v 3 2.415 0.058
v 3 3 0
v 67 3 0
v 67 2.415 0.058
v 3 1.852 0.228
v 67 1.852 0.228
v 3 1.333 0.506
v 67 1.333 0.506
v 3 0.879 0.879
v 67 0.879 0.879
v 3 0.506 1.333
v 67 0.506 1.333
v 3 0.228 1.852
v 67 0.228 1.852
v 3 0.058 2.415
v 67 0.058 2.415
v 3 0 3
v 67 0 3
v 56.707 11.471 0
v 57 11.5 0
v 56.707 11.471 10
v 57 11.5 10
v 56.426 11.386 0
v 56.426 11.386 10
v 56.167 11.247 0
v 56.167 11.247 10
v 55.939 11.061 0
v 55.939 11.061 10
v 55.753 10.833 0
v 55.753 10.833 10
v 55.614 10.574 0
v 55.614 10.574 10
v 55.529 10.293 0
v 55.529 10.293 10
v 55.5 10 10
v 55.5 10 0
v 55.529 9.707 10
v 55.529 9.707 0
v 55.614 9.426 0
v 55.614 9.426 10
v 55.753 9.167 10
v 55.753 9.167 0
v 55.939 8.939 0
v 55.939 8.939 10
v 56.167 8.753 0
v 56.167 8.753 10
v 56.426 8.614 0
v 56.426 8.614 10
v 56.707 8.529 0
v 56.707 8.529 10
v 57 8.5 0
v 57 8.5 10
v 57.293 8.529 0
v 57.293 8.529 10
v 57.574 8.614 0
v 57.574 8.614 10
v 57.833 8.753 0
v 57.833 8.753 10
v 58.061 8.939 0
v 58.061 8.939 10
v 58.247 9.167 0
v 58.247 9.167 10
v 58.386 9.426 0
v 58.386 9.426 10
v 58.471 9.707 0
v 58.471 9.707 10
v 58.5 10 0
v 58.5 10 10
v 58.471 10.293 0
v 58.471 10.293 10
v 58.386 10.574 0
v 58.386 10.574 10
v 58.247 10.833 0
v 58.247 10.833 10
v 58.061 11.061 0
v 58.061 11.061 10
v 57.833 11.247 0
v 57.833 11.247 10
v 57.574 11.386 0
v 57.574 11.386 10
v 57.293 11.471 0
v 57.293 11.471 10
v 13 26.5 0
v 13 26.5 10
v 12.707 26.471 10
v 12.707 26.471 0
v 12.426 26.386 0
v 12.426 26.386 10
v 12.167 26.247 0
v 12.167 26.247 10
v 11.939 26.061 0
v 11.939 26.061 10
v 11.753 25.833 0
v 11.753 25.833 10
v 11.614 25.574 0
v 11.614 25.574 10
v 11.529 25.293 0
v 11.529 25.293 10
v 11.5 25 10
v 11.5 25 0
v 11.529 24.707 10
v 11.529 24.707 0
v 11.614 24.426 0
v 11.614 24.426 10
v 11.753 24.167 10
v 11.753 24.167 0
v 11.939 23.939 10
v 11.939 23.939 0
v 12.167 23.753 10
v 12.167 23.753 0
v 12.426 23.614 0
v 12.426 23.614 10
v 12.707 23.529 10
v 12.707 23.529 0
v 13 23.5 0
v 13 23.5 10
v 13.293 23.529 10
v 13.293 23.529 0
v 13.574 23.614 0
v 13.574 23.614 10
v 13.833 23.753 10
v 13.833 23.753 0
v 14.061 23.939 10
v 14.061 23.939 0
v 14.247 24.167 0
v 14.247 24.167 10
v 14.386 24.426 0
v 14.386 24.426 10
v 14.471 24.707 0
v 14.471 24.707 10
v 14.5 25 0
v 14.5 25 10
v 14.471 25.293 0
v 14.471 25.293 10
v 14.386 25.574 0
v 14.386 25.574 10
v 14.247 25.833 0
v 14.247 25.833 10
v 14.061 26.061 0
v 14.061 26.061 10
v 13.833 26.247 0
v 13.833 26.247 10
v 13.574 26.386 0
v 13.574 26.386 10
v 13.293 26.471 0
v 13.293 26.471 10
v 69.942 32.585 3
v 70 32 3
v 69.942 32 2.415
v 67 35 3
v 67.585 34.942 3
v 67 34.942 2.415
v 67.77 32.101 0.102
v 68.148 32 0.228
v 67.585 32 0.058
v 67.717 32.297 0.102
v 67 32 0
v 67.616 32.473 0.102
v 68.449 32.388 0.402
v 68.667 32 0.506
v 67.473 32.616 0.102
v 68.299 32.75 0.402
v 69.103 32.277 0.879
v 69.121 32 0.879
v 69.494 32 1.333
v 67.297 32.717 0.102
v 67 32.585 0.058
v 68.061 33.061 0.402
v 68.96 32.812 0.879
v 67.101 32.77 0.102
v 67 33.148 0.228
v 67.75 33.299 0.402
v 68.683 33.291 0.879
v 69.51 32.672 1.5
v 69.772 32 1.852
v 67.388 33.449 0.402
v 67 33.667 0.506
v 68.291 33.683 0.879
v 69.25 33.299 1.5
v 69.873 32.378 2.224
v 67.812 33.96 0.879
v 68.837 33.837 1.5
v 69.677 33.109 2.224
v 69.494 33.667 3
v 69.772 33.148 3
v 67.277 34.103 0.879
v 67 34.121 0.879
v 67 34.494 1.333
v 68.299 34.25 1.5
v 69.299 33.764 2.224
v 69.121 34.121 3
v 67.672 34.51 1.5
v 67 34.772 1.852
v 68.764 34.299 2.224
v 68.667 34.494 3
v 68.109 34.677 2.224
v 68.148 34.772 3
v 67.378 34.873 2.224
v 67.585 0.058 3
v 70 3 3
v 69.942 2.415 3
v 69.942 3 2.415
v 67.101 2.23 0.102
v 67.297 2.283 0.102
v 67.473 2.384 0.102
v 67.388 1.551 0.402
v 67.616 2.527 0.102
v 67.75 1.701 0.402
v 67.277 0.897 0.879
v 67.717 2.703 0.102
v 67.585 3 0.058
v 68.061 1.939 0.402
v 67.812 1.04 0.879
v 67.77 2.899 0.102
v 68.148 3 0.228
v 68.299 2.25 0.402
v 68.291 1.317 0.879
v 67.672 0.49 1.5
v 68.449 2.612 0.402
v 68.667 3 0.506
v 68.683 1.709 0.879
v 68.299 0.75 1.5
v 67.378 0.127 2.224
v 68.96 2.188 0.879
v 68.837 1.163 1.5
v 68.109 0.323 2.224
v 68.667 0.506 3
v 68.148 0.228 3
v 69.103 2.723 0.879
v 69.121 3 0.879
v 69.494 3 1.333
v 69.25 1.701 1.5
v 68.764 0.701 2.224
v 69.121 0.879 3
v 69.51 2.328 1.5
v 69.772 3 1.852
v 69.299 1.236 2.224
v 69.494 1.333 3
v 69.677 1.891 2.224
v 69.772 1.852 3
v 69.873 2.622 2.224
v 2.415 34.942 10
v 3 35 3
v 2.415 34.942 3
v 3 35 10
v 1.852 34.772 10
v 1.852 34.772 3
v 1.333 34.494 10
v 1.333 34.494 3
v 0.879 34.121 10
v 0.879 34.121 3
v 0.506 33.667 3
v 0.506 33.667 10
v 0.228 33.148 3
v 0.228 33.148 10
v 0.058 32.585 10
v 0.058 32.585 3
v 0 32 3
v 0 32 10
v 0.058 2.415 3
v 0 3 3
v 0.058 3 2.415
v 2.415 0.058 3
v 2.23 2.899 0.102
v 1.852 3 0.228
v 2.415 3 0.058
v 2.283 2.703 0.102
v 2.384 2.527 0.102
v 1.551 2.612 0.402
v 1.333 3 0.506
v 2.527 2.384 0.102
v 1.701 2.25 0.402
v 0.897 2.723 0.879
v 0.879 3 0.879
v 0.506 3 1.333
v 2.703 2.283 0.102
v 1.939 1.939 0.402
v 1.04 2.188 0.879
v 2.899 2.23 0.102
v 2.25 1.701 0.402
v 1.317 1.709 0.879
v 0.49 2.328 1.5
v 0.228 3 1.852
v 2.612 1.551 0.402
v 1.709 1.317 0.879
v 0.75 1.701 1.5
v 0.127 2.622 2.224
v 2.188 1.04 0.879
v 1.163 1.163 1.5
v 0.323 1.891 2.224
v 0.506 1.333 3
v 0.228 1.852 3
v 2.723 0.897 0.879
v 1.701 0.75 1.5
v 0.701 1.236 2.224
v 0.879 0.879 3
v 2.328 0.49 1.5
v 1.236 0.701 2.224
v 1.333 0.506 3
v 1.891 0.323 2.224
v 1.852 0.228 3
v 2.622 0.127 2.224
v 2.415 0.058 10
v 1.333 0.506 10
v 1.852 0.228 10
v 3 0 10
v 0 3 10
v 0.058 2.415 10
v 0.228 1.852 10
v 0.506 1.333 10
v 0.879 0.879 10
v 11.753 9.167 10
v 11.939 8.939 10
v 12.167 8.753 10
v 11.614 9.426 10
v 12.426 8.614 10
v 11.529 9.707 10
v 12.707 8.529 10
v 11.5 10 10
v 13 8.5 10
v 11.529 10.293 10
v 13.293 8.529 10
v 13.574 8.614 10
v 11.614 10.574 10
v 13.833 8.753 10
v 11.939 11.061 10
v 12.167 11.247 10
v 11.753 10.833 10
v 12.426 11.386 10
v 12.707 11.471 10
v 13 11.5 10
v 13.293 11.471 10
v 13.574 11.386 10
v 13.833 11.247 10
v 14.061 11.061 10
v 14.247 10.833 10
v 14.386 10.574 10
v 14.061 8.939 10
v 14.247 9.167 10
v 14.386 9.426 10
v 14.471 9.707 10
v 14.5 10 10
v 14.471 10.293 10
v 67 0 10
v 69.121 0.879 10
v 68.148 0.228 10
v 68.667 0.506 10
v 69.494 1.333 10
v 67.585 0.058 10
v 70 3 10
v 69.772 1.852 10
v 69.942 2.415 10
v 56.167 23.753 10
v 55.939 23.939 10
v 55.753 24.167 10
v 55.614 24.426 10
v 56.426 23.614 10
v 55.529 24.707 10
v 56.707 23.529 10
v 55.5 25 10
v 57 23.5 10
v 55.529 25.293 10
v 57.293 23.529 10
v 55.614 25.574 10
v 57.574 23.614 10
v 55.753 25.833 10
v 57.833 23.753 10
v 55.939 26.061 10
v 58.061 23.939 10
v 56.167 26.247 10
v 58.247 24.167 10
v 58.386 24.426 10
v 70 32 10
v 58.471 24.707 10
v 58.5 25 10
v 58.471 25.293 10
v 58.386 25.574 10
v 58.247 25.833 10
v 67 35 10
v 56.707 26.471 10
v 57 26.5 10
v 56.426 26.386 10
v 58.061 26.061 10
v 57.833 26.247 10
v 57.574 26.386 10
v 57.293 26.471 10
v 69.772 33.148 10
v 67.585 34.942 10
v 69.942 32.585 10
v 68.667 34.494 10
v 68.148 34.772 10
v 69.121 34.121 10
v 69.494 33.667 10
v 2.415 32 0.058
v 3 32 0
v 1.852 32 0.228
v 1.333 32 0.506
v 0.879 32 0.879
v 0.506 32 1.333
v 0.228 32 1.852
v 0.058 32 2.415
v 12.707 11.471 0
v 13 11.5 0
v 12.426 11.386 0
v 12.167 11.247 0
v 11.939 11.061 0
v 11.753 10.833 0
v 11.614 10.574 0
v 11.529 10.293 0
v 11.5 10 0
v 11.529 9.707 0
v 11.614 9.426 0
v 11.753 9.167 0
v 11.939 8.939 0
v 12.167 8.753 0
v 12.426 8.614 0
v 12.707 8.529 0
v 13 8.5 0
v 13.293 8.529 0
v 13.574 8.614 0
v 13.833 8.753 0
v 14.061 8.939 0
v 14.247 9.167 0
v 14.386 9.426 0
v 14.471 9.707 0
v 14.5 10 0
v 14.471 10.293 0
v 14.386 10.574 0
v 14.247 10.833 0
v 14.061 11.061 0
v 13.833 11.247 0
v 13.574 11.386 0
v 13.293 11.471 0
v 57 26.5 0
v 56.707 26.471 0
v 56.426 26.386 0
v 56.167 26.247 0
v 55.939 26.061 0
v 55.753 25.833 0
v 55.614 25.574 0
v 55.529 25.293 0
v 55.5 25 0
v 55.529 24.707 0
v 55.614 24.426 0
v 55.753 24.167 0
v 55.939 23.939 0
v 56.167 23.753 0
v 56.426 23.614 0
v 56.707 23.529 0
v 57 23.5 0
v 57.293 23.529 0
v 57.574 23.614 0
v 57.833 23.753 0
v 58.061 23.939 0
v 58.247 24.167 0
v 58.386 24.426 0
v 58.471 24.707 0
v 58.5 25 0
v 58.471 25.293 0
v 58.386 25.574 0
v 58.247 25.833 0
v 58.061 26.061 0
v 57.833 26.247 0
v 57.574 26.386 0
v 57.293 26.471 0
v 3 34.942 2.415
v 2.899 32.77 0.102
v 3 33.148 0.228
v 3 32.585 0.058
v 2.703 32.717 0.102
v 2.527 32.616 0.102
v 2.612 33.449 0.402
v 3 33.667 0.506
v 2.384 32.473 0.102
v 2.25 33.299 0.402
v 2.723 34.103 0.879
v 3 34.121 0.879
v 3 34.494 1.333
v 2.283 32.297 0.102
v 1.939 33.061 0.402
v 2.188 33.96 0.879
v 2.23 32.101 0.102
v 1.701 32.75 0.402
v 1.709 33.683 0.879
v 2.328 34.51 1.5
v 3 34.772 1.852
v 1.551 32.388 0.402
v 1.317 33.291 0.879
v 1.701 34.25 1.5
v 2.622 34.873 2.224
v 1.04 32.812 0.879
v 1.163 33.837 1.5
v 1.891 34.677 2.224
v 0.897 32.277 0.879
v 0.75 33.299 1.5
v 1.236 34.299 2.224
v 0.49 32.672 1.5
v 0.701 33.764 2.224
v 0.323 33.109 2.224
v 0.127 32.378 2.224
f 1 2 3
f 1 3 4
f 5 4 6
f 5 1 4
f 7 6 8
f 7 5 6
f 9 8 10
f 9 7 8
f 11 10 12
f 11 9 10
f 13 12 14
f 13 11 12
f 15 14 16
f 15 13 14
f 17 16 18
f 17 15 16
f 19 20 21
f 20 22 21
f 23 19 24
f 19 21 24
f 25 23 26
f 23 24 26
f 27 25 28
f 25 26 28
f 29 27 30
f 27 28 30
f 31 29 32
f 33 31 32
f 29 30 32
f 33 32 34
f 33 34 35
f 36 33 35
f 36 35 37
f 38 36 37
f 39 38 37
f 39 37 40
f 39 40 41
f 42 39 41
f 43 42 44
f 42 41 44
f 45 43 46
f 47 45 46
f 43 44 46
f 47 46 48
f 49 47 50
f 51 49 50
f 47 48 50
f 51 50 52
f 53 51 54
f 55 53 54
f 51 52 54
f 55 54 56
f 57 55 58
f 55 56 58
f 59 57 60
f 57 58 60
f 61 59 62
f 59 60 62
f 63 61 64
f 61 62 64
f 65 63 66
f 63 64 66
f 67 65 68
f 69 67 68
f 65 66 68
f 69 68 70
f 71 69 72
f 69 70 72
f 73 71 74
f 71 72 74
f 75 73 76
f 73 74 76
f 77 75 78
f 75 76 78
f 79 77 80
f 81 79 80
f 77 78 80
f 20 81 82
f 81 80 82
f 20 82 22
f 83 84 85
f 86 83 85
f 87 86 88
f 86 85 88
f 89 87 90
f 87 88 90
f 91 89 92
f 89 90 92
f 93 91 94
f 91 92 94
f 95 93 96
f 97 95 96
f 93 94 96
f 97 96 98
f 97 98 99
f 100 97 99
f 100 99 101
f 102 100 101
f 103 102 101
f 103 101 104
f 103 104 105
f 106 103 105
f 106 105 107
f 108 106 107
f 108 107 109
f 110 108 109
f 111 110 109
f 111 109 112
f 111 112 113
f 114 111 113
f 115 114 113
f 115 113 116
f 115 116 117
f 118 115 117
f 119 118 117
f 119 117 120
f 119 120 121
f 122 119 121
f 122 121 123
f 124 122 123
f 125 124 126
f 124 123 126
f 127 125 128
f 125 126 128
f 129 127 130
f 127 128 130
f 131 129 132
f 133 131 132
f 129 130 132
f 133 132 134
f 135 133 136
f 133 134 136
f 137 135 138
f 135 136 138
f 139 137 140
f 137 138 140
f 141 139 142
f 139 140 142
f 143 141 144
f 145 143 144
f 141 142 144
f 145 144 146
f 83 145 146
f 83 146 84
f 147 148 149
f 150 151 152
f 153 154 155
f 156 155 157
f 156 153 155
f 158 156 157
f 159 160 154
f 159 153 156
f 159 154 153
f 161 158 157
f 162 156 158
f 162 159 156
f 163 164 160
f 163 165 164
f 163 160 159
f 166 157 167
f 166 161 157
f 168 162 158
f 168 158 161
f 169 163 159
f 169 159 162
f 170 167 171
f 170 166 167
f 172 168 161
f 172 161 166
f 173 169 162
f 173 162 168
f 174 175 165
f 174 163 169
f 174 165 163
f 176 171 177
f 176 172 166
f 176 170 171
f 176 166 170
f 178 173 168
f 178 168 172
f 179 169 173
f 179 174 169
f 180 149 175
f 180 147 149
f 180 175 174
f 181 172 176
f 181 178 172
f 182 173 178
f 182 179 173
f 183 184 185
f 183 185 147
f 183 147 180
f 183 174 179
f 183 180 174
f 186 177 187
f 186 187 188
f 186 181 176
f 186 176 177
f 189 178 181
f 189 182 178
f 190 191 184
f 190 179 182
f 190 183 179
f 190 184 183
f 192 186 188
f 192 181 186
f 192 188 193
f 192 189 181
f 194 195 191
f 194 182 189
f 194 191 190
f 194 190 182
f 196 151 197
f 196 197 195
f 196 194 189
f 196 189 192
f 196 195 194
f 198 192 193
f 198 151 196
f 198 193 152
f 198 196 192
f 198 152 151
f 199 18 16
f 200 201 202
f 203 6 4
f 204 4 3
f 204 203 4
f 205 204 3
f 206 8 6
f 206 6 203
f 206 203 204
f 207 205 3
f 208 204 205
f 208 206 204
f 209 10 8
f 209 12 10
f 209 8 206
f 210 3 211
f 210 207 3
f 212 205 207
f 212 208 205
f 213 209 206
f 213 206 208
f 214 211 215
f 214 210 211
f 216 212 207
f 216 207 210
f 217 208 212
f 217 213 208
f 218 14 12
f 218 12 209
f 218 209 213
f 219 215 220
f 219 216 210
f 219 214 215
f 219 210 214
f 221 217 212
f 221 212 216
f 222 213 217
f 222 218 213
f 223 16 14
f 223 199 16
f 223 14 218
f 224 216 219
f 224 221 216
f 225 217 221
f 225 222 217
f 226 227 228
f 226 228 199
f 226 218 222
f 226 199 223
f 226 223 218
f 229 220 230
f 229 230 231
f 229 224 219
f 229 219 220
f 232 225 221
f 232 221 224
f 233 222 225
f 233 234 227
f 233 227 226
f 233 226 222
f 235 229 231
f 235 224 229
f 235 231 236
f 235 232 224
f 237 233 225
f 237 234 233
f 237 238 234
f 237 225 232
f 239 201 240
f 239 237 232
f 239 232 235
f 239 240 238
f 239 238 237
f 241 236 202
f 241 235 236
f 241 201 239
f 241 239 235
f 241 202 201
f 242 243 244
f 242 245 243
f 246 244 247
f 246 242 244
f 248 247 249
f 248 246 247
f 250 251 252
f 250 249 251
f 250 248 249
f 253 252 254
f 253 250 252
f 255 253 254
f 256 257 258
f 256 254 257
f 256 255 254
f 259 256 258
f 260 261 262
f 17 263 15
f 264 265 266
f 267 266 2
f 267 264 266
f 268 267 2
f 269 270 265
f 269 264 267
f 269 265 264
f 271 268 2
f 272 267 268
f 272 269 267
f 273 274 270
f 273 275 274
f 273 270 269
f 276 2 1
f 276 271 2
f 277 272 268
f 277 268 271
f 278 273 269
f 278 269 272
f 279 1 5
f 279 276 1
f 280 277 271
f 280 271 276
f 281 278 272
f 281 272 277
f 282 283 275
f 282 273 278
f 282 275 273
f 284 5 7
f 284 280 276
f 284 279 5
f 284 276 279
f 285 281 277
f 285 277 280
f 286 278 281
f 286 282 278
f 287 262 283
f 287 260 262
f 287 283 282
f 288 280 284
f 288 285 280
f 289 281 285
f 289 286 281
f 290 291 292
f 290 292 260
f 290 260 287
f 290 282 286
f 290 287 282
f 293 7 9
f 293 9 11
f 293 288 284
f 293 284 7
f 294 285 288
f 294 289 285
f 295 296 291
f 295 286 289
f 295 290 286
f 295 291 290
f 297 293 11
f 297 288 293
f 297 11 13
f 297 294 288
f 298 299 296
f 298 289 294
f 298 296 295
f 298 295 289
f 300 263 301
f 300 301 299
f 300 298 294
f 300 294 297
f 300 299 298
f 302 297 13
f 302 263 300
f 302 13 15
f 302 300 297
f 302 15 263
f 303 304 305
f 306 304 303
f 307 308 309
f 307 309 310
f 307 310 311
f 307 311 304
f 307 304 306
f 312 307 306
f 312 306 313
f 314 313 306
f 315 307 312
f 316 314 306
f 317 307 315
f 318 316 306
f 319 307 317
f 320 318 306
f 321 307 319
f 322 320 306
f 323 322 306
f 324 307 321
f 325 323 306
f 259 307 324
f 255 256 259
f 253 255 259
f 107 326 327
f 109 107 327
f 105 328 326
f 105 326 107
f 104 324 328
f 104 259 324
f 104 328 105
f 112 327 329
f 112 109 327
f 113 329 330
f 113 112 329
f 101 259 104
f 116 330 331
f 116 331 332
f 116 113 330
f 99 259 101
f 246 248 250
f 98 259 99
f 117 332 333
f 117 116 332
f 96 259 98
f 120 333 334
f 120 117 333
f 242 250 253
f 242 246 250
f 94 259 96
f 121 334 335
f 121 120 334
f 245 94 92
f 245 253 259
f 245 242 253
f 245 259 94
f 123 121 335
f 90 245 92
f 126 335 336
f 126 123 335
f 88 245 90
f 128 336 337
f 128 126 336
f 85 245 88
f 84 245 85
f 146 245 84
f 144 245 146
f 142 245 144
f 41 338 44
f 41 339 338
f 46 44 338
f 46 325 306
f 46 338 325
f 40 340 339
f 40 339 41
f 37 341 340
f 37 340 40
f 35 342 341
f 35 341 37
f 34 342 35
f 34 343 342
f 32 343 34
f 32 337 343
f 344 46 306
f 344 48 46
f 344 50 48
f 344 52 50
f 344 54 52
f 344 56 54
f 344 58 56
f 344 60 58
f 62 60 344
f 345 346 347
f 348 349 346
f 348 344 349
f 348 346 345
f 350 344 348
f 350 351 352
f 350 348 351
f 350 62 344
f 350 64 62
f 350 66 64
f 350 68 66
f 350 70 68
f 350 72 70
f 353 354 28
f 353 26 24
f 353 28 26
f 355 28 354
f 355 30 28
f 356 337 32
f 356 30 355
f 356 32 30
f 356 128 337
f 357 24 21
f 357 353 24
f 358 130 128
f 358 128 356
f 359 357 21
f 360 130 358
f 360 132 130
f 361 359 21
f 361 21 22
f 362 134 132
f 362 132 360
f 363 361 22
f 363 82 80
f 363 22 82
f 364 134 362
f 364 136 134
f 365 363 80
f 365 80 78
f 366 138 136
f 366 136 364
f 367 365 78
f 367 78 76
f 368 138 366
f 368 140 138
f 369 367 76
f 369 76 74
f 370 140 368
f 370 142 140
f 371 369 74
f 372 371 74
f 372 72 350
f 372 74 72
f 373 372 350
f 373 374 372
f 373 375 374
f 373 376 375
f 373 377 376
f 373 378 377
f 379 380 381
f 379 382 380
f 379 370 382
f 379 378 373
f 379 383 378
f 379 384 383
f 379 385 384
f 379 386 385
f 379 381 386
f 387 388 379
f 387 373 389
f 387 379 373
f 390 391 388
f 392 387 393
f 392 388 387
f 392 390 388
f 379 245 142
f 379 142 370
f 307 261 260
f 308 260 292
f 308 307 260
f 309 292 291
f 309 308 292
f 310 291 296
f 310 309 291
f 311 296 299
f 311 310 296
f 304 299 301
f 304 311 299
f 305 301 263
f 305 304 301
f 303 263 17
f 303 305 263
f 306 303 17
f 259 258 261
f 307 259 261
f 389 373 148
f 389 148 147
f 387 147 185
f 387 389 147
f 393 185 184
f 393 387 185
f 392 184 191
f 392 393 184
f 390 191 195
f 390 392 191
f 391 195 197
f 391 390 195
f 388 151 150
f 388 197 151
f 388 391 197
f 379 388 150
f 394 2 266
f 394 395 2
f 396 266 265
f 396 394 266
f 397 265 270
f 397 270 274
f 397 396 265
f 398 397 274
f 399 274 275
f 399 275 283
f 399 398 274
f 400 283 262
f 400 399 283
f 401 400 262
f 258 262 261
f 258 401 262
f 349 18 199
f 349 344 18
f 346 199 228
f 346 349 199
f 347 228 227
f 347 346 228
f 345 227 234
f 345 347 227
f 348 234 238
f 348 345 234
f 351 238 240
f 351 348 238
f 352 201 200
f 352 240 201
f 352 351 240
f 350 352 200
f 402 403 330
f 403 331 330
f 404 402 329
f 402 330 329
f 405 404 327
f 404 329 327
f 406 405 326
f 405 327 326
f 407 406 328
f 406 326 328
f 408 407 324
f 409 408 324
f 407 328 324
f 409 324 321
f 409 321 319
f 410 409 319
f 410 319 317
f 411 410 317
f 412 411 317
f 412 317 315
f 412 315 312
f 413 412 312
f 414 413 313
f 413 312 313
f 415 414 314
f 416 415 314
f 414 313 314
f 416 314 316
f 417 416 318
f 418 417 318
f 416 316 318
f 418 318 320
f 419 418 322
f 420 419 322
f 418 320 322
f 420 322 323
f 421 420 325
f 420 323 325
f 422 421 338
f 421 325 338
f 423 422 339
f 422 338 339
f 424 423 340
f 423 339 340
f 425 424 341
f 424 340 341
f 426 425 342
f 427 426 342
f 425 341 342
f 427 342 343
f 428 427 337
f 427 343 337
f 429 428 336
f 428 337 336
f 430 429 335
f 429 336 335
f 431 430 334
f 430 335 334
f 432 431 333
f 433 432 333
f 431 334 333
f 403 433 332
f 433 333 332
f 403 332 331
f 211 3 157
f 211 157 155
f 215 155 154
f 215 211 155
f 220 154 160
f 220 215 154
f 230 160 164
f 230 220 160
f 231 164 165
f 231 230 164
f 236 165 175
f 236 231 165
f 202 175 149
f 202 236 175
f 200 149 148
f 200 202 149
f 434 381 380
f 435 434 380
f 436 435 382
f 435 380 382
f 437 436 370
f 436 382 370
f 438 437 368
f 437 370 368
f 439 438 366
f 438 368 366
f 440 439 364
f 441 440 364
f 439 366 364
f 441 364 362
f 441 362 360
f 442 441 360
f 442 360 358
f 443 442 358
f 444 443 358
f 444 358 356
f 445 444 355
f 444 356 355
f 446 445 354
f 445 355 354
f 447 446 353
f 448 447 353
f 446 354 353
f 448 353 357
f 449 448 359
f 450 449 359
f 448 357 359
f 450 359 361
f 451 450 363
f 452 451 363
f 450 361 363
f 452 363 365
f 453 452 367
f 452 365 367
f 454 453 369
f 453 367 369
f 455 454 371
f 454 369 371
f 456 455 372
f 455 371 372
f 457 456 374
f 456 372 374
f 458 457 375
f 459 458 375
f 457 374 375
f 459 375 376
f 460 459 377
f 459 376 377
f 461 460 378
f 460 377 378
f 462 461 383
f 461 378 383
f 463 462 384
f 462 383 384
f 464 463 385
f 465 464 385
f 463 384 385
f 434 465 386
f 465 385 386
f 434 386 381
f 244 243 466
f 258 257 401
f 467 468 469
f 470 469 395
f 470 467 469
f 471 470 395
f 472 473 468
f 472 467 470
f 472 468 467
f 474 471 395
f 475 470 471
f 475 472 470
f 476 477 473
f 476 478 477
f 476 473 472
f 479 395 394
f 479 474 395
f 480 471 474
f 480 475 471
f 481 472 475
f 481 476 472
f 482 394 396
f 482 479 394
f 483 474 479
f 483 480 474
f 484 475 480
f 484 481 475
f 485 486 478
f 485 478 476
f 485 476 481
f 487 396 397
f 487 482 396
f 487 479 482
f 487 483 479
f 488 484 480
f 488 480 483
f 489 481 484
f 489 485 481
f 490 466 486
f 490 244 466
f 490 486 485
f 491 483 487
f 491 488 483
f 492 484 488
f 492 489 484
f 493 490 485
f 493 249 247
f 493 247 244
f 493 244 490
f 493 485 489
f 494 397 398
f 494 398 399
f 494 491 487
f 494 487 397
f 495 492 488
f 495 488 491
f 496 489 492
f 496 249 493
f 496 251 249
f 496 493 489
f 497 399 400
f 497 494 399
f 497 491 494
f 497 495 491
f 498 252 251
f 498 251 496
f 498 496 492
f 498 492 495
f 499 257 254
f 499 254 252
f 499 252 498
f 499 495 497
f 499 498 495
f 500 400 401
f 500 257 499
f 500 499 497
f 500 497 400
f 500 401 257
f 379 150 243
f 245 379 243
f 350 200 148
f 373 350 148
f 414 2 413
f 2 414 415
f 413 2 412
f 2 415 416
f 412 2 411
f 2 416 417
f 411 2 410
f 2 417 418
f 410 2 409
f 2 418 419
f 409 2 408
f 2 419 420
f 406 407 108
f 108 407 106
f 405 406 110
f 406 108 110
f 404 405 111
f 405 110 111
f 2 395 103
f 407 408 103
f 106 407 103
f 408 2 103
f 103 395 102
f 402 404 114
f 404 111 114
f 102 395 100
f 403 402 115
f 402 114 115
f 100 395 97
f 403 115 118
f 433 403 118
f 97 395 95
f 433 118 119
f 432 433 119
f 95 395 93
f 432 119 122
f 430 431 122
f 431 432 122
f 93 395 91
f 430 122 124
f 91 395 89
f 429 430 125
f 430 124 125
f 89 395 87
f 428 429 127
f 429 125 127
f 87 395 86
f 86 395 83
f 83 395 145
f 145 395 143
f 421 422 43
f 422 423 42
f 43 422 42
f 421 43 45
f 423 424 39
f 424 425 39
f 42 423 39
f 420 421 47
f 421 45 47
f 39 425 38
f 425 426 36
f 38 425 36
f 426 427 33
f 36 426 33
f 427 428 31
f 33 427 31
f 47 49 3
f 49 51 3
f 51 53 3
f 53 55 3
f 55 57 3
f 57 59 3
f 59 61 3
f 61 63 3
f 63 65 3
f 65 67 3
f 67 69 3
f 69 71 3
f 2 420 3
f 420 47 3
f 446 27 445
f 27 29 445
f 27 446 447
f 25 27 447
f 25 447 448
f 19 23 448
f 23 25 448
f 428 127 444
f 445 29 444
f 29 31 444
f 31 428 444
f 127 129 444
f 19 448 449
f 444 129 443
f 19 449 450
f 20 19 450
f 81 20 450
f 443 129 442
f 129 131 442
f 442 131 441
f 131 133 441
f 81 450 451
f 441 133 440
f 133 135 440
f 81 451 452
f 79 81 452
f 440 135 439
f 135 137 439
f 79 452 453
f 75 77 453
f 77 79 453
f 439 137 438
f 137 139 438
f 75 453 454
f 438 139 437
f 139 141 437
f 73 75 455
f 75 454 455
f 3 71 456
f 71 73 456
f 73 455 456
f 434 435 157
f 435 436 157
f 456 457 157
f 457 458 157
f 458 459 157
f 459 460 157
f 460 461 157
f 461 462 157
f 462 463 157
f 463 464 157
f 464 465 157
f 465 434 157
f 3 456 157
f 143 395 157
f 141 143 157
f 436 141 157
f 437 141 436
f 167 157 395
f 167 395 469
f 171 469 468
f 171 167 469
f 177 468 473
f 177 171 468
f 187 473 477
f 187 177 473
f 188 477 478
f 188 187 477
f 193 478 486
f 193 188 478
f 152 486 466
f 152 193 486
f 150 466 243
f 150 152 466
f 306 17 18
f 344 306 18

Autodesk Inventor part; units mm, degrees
ref_plane "YZ Plane" through (0, 0, 0) normal (1, 0, 0) x (0, 1, 0)
ref_plane "XZ Plane" through (0, 0, 0) normal (0, 1, 0) x (-1, 0, 0)
ref_plane "XY Plane" through (0, 0, 0) normal (0, 0, 1) x (1, 0, 0)
sketch "Esboço1" plane through (0, 0, 0) normal (0, 0, 1) x (1, 0, 0)
  line L0 (0, 0) -> (70, 0)
  line L1 (70, 0) -> (70, 35)
  line L2 (70, 35) -> (0, 35)
  line L3 (0, 35) -> (0, 0)
  dimension "d0" = 70
  dimension "d1" = 35
extrude "Extrusão1" add sketch "Esboço1" along normal blind 10
fillet "Arredondamento1" radius 3 4 edges at (70, 35, 5) (70, 0, 5) (0, 35, 5) (0, 0, 5)
fillet "Arredondamento2" radius 3 8 edges at (0.8787, 34.1213, 0) (0, 17.5, 0) (0.8787, 0.8787, 0) (35, 0, 0) (69.1213, 0.8787, 0) (70, 17.5, 0) (69.1213, 34.1213, 0) (35, 35, 0)
sketch "Esboço3" plane through (0, 0, 0) normal (0, 0, -1) x (-1, 0, 0)
  line L0 (-3, 35) -> (-67, 35) projected
  line L1 (-67, 3) -> (-67, 32) projected
  line L2 (-67, 0) -> (-3, 0) projected
  line L3 (-3, 32) -> (-3, 3) projected
  point P0 (0, 0)
  point P1 (-57, 25)
  point P2 (-13, 25)
  point P3 (-13, 10)
  point P4 (-57, 10)
  dimension "d18" = 10
  dimension "d19" = 10
  dimension "d20" = 10
  dimension "d21" = 10
  dimension "d22" = 10
  dimension "d23" = 10
  dimension "d24" = 10
  dimension "d25" = 10
hole "Furo1" at (57, 25, 0) at (13, 25, 0) at (13, 10, 0) at (57, 10, 0) direction (0, 0, 1) diameter 3 end through all
thread "Rosca1" size "M3x0.35" class "6H" standard "ANSI Metric M Profile" length 3 offset 7
thread "Rosca2" size "M3x0.5" class "6H" standard "ANSI Metric M Profile" length 3
thread "Rosca3" size "M3x0.5" class "6H" standard "ANSI Metric M Profile" length 3
thread "Rosca4" size "M3x0.5" class "6H" standard "ANSI Metric M Profile" length 3
equation "\"d19\" = d18"
equation "\"d20\" = d18"
equation "\"d21\" = d18"
equation "\"d22\" = d18"
equation "\"d23\" = d18"
equation "\"d24\" = d18"
equation "\"d25\" = d18"
properties part number "Peça4-Rubia"
